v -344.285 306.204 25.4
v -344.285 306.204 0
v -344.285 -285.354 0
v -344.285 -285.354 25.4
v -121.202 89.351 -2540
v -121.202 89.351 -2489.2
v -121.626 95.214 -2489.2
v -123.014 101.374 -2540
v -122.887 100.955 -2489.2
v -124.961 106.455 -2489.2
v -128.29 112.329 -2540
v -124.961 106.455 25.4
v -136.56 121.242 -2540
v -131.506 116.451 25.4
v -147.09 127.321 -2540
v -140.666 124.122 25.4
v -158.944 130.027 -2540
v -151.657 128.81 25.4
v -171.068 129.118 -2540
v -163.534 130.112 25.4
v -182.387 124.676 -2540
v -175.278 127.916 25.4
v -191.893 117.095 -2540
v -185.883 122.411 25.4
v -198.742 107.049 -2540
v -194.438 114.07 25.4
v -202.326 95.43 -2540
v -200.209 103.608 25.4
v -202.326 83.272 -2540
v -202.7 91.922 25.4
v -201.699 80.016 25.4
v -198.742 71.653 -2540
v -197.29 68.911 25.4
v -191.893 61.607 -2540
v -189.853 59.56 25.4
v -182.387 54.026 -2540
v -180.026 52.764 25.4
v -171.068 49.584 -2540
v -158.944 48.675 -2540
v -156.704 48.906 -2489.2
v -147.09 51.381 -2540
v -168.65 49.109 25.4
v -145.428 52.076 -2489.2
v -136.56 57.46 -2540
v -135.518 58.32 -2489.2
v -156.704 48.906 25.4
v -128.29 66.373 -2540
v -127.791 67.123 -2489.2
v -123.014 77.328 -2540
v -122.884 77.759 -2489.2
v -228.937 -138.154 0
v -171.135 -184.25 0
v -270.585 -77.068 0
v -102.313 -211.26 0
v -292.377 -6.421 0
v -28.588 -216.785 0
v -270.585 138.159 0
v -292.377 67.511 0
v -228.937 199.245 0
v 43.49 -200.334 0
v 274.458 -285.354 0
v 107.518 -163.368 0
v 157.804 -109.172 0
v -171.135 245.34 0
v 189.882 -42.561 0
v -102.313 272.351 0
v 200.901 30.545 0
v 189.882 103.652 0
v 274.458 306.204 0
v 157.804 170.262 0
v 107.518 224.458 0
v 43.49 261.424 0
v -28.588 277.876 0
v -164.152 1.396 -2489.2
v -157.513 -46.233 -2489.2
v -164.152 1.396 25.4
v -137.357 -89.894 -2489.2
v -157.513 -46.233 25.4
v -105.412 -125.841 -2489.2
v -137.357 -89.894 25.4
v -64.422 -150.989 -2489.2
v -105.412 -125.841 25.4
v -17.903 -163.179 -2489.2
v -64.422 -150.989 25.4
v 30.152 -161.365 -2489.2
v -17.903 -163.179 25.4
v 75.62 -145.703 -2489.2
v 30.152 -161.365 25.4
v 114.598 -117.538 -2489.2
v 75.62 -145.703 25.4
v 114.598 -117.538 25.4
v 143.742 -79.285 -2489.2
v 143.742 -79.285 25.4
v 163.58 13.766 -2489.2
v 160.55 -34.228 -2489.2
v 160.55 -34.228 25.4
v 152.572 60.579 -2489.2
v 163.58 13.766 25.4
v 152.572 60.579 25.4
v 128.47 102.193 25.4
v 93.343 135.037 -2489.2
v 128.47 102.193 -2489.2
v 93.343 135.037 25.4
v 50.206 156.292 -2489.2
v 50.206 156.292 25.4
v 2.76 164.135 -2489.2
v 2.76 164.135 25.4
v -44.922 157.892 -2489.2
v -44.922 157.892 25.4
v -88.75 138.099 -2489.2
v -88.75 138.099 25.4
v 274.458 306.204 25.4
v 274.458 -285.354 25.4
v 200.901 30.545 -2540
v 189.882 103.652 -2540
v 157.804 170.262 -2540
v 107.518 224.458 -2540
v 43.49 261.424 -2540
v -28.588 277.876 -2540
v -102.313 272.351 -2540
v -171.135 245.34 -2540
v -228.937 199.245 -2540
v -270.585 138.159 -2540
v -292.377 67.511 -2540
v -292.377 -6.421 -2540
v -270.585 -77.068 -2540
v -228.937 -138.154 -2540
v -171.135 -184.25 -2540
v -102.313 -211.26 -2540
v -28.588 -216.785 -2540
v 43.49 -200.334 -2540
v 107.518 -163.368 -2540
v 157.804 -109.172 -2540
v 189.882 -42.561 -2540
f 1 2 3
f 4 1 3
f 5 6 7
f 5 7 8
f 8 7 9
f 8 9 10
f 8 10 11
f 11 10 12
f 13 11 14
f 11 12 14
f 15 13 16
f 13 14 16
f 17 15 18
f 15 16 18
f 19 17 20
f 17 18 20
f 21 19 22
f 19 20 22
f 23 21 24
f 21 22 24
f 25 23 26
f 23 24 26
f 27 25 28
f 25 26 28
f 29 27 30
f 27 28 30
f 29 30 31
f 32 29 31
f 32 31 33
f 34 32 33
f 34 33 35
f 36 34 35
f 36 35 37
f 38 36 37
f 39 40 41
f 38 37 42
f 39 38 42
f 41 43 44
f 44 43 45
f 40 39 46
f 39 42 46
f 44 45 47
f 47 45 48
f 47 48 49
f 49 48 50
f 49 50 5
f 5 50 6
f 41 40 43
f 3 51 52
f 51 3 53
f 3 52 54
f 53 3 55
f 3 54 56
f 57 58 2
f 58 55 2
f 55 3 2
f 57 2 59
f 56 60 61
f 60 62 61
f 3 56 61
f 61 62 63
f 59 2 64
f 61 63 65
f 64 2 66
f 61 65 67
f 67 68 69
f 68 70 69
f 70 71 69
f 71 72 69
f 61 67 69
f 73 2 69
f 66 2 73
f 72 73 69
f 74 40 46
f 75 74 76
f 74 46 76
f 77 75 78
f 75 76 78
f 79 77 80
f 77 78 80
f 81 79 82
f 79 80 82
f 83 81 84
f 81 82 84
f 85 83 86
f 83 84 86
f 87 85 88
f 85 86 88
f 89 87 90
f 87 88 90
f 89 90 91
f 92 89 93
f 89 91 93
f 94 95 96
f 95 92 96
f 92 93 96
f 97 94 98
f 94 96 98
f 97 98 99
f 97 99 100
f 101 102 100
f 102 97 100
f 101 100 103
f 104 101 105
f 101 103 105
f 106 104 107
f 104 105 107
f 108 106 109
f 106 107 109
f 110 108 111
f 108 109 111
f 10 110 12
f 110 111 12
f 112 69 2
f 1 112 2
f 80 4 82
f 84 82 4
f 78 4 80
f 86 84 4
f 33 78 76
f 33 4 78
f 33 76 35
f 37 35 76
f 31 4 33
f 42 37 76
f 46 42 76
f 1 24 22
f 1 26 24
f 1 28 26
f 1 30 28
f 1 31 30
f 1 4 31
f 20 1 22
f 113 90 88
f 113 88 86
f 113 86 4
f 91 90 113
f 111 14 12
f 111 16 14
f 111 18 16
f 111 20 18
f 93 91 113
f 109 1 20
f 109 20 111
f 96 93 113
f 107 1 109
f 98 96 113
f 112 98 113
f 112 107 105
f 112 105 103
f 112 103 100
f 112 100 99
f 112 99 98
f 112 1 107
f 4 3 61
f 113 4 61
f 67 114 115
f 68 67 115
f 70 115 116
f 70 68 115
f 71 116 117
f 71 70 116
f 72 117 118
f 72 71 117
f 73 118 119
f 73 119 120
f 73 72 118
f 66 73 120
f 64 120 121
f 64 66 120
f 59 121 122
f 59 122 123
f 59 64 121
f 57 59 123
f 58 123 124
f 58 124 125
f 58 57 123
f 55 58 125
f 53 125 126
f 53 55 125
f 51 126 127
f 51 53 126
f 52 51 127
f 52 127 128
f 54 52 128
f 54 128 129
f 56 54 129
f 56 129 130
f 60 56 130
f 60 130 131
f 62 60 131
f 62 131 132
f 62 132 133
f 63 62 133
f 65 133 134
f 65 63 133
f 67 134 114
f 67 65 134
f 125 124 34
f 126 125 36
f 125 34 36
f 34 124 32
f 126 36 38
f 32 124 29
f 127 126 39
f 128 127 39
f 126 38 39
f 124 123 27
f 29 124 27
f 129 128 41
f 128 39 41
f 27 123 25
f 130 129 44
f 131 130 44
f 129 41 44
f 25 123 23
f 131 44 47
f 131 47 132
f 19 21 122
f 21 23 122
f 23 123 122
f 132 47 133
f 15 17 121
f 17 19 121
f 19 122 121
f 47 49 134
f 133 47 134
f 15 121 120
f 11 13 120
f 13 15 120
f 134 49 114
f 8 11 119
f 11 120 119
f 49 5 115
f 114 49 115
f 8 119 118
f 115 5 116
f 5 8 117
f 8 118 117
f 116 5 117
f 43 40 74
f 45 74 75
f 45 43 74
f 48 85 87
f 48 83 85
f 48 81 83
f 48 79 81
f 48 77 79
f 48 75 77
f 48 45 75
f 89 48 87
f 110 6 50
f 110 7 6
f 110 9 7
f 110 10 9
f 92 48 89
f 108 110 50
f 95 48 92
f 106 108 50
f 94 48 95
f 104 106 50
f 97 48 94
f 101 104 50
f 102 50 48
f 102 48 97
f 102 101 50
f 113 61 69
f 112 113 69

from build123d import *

# Parameters (mm, degrees)
F2_DEPTH  = 25.4
F3_R      = 248.0240216894
F4_DEPTH  = 2540
F5_W      = 119.7975315154
F5_H      = 181.1522692442
F5_W_2    = 320.4690925777
F5_H_2    = 205.2030339837
F5_W_3    = 6.3688382506
F5_W_4    = 172.1075996757
F6_DEPTH  = 25.4
F7_R      = 40.7896547179
F8_DEPTH  = 2565.401
F9_R      = 164.1580524022
F10_DEPTH = 2514.6


with BuildPart() as f2:
    # F1 (on face) → F2 (new body)
    with BuildSketch(Plane.XY):
        Polygon((-21.2495476007, -69.6708932519), (-21.2495476007, 53.5316392779), (0, 53.5316392779), (0, 76.628908515), (-80.3218334913, 76.628908515), (-80.3218334913, -69.6708932519), align=None)
        Polygon((0, 76.628908515), (0, 53.5316392779), (0, -69.6708932519), (74.5332688093, -69.6708932519), (74.5332688093, 76.628908515), align=None)
        Polygon((0, -69.6708932519), (-21.2495476007, -69.6708932519), (-80.3218334913, -69.6708932519), (-80.3218334913, -80.1510289311), (74.5332688093, -80.1510289311), (74.5332688093, -69.6708932519), align=None)
    extrude(amount=F2_DEPTH)

    # F3 (on Top) → F4 (join)
    with BuildSketch(Plane.XY):
        with Locations((-47.1228808165, 30.5453538895)):
            Circle(F3_R)
    extrude(amount=-F4_DEPTH)

    # F5 (on face) → F6 (join)
    with BuildSketch(Plane.XY):
        with Locations((36.0827576369, 215.6281396747)):
            Rectangle(F5_W, F5_H)
        with Locations((-184.0505544096, 215.6281396747)):
            Rectangle(F5_W_2, F5_H)
        with Locations((-184.0505544096, 22.4504880607)):
            Rectangle(F5_W_2, F5_H_2)
        with Locations((99.1659425199, 215.6281396747)):
            Rectangle(F5_W_3, F5_H)
        Polygon((95.9815233946, -80.1510289311), (-23.8160081208, -80.1510289311), (-23.8160081208, -285.3540629148), (102.3503616452, -285.3540629148), (102.3503616452, -80.1510289311), align=None)
        with Locations((-184.0505544096, -182.752545923)):
            Rectangle(F5_W_2, F5_H_2)
        with Locations((188.404161483, 215.6281396747)):
            Rectangle(F5_W_4, F5_H)
        with Locations((188.404161483, 22.4504880607)):
            Rectangle(F5_W_4, F5_H_2)
        with Locations((188.404161483, -182.752545923)):
            Rectangle(F5_W_4, F5_H_2)
    extrude(amount=F6_DEPTH)

    # F7 (on face) → F8 (cut, through all)
    with BuildSketch(Plane.XY.offset(25.4)):
        with Locations((-161.9917303324, 89.3510133028)):
            Circle(F7_R)
    extrude(amount=-F8_DEPTH, mode=Mode.SUBTRACT)

    # F9 (on face) → F10 (cut)
    with BuildSketch(Plane.XY.offset(25.4)):
        Circle(F9_R)
    extrude(amount=-F10_DEPTH, mode=Mode.SUBTRACT)


solid = f2.part
